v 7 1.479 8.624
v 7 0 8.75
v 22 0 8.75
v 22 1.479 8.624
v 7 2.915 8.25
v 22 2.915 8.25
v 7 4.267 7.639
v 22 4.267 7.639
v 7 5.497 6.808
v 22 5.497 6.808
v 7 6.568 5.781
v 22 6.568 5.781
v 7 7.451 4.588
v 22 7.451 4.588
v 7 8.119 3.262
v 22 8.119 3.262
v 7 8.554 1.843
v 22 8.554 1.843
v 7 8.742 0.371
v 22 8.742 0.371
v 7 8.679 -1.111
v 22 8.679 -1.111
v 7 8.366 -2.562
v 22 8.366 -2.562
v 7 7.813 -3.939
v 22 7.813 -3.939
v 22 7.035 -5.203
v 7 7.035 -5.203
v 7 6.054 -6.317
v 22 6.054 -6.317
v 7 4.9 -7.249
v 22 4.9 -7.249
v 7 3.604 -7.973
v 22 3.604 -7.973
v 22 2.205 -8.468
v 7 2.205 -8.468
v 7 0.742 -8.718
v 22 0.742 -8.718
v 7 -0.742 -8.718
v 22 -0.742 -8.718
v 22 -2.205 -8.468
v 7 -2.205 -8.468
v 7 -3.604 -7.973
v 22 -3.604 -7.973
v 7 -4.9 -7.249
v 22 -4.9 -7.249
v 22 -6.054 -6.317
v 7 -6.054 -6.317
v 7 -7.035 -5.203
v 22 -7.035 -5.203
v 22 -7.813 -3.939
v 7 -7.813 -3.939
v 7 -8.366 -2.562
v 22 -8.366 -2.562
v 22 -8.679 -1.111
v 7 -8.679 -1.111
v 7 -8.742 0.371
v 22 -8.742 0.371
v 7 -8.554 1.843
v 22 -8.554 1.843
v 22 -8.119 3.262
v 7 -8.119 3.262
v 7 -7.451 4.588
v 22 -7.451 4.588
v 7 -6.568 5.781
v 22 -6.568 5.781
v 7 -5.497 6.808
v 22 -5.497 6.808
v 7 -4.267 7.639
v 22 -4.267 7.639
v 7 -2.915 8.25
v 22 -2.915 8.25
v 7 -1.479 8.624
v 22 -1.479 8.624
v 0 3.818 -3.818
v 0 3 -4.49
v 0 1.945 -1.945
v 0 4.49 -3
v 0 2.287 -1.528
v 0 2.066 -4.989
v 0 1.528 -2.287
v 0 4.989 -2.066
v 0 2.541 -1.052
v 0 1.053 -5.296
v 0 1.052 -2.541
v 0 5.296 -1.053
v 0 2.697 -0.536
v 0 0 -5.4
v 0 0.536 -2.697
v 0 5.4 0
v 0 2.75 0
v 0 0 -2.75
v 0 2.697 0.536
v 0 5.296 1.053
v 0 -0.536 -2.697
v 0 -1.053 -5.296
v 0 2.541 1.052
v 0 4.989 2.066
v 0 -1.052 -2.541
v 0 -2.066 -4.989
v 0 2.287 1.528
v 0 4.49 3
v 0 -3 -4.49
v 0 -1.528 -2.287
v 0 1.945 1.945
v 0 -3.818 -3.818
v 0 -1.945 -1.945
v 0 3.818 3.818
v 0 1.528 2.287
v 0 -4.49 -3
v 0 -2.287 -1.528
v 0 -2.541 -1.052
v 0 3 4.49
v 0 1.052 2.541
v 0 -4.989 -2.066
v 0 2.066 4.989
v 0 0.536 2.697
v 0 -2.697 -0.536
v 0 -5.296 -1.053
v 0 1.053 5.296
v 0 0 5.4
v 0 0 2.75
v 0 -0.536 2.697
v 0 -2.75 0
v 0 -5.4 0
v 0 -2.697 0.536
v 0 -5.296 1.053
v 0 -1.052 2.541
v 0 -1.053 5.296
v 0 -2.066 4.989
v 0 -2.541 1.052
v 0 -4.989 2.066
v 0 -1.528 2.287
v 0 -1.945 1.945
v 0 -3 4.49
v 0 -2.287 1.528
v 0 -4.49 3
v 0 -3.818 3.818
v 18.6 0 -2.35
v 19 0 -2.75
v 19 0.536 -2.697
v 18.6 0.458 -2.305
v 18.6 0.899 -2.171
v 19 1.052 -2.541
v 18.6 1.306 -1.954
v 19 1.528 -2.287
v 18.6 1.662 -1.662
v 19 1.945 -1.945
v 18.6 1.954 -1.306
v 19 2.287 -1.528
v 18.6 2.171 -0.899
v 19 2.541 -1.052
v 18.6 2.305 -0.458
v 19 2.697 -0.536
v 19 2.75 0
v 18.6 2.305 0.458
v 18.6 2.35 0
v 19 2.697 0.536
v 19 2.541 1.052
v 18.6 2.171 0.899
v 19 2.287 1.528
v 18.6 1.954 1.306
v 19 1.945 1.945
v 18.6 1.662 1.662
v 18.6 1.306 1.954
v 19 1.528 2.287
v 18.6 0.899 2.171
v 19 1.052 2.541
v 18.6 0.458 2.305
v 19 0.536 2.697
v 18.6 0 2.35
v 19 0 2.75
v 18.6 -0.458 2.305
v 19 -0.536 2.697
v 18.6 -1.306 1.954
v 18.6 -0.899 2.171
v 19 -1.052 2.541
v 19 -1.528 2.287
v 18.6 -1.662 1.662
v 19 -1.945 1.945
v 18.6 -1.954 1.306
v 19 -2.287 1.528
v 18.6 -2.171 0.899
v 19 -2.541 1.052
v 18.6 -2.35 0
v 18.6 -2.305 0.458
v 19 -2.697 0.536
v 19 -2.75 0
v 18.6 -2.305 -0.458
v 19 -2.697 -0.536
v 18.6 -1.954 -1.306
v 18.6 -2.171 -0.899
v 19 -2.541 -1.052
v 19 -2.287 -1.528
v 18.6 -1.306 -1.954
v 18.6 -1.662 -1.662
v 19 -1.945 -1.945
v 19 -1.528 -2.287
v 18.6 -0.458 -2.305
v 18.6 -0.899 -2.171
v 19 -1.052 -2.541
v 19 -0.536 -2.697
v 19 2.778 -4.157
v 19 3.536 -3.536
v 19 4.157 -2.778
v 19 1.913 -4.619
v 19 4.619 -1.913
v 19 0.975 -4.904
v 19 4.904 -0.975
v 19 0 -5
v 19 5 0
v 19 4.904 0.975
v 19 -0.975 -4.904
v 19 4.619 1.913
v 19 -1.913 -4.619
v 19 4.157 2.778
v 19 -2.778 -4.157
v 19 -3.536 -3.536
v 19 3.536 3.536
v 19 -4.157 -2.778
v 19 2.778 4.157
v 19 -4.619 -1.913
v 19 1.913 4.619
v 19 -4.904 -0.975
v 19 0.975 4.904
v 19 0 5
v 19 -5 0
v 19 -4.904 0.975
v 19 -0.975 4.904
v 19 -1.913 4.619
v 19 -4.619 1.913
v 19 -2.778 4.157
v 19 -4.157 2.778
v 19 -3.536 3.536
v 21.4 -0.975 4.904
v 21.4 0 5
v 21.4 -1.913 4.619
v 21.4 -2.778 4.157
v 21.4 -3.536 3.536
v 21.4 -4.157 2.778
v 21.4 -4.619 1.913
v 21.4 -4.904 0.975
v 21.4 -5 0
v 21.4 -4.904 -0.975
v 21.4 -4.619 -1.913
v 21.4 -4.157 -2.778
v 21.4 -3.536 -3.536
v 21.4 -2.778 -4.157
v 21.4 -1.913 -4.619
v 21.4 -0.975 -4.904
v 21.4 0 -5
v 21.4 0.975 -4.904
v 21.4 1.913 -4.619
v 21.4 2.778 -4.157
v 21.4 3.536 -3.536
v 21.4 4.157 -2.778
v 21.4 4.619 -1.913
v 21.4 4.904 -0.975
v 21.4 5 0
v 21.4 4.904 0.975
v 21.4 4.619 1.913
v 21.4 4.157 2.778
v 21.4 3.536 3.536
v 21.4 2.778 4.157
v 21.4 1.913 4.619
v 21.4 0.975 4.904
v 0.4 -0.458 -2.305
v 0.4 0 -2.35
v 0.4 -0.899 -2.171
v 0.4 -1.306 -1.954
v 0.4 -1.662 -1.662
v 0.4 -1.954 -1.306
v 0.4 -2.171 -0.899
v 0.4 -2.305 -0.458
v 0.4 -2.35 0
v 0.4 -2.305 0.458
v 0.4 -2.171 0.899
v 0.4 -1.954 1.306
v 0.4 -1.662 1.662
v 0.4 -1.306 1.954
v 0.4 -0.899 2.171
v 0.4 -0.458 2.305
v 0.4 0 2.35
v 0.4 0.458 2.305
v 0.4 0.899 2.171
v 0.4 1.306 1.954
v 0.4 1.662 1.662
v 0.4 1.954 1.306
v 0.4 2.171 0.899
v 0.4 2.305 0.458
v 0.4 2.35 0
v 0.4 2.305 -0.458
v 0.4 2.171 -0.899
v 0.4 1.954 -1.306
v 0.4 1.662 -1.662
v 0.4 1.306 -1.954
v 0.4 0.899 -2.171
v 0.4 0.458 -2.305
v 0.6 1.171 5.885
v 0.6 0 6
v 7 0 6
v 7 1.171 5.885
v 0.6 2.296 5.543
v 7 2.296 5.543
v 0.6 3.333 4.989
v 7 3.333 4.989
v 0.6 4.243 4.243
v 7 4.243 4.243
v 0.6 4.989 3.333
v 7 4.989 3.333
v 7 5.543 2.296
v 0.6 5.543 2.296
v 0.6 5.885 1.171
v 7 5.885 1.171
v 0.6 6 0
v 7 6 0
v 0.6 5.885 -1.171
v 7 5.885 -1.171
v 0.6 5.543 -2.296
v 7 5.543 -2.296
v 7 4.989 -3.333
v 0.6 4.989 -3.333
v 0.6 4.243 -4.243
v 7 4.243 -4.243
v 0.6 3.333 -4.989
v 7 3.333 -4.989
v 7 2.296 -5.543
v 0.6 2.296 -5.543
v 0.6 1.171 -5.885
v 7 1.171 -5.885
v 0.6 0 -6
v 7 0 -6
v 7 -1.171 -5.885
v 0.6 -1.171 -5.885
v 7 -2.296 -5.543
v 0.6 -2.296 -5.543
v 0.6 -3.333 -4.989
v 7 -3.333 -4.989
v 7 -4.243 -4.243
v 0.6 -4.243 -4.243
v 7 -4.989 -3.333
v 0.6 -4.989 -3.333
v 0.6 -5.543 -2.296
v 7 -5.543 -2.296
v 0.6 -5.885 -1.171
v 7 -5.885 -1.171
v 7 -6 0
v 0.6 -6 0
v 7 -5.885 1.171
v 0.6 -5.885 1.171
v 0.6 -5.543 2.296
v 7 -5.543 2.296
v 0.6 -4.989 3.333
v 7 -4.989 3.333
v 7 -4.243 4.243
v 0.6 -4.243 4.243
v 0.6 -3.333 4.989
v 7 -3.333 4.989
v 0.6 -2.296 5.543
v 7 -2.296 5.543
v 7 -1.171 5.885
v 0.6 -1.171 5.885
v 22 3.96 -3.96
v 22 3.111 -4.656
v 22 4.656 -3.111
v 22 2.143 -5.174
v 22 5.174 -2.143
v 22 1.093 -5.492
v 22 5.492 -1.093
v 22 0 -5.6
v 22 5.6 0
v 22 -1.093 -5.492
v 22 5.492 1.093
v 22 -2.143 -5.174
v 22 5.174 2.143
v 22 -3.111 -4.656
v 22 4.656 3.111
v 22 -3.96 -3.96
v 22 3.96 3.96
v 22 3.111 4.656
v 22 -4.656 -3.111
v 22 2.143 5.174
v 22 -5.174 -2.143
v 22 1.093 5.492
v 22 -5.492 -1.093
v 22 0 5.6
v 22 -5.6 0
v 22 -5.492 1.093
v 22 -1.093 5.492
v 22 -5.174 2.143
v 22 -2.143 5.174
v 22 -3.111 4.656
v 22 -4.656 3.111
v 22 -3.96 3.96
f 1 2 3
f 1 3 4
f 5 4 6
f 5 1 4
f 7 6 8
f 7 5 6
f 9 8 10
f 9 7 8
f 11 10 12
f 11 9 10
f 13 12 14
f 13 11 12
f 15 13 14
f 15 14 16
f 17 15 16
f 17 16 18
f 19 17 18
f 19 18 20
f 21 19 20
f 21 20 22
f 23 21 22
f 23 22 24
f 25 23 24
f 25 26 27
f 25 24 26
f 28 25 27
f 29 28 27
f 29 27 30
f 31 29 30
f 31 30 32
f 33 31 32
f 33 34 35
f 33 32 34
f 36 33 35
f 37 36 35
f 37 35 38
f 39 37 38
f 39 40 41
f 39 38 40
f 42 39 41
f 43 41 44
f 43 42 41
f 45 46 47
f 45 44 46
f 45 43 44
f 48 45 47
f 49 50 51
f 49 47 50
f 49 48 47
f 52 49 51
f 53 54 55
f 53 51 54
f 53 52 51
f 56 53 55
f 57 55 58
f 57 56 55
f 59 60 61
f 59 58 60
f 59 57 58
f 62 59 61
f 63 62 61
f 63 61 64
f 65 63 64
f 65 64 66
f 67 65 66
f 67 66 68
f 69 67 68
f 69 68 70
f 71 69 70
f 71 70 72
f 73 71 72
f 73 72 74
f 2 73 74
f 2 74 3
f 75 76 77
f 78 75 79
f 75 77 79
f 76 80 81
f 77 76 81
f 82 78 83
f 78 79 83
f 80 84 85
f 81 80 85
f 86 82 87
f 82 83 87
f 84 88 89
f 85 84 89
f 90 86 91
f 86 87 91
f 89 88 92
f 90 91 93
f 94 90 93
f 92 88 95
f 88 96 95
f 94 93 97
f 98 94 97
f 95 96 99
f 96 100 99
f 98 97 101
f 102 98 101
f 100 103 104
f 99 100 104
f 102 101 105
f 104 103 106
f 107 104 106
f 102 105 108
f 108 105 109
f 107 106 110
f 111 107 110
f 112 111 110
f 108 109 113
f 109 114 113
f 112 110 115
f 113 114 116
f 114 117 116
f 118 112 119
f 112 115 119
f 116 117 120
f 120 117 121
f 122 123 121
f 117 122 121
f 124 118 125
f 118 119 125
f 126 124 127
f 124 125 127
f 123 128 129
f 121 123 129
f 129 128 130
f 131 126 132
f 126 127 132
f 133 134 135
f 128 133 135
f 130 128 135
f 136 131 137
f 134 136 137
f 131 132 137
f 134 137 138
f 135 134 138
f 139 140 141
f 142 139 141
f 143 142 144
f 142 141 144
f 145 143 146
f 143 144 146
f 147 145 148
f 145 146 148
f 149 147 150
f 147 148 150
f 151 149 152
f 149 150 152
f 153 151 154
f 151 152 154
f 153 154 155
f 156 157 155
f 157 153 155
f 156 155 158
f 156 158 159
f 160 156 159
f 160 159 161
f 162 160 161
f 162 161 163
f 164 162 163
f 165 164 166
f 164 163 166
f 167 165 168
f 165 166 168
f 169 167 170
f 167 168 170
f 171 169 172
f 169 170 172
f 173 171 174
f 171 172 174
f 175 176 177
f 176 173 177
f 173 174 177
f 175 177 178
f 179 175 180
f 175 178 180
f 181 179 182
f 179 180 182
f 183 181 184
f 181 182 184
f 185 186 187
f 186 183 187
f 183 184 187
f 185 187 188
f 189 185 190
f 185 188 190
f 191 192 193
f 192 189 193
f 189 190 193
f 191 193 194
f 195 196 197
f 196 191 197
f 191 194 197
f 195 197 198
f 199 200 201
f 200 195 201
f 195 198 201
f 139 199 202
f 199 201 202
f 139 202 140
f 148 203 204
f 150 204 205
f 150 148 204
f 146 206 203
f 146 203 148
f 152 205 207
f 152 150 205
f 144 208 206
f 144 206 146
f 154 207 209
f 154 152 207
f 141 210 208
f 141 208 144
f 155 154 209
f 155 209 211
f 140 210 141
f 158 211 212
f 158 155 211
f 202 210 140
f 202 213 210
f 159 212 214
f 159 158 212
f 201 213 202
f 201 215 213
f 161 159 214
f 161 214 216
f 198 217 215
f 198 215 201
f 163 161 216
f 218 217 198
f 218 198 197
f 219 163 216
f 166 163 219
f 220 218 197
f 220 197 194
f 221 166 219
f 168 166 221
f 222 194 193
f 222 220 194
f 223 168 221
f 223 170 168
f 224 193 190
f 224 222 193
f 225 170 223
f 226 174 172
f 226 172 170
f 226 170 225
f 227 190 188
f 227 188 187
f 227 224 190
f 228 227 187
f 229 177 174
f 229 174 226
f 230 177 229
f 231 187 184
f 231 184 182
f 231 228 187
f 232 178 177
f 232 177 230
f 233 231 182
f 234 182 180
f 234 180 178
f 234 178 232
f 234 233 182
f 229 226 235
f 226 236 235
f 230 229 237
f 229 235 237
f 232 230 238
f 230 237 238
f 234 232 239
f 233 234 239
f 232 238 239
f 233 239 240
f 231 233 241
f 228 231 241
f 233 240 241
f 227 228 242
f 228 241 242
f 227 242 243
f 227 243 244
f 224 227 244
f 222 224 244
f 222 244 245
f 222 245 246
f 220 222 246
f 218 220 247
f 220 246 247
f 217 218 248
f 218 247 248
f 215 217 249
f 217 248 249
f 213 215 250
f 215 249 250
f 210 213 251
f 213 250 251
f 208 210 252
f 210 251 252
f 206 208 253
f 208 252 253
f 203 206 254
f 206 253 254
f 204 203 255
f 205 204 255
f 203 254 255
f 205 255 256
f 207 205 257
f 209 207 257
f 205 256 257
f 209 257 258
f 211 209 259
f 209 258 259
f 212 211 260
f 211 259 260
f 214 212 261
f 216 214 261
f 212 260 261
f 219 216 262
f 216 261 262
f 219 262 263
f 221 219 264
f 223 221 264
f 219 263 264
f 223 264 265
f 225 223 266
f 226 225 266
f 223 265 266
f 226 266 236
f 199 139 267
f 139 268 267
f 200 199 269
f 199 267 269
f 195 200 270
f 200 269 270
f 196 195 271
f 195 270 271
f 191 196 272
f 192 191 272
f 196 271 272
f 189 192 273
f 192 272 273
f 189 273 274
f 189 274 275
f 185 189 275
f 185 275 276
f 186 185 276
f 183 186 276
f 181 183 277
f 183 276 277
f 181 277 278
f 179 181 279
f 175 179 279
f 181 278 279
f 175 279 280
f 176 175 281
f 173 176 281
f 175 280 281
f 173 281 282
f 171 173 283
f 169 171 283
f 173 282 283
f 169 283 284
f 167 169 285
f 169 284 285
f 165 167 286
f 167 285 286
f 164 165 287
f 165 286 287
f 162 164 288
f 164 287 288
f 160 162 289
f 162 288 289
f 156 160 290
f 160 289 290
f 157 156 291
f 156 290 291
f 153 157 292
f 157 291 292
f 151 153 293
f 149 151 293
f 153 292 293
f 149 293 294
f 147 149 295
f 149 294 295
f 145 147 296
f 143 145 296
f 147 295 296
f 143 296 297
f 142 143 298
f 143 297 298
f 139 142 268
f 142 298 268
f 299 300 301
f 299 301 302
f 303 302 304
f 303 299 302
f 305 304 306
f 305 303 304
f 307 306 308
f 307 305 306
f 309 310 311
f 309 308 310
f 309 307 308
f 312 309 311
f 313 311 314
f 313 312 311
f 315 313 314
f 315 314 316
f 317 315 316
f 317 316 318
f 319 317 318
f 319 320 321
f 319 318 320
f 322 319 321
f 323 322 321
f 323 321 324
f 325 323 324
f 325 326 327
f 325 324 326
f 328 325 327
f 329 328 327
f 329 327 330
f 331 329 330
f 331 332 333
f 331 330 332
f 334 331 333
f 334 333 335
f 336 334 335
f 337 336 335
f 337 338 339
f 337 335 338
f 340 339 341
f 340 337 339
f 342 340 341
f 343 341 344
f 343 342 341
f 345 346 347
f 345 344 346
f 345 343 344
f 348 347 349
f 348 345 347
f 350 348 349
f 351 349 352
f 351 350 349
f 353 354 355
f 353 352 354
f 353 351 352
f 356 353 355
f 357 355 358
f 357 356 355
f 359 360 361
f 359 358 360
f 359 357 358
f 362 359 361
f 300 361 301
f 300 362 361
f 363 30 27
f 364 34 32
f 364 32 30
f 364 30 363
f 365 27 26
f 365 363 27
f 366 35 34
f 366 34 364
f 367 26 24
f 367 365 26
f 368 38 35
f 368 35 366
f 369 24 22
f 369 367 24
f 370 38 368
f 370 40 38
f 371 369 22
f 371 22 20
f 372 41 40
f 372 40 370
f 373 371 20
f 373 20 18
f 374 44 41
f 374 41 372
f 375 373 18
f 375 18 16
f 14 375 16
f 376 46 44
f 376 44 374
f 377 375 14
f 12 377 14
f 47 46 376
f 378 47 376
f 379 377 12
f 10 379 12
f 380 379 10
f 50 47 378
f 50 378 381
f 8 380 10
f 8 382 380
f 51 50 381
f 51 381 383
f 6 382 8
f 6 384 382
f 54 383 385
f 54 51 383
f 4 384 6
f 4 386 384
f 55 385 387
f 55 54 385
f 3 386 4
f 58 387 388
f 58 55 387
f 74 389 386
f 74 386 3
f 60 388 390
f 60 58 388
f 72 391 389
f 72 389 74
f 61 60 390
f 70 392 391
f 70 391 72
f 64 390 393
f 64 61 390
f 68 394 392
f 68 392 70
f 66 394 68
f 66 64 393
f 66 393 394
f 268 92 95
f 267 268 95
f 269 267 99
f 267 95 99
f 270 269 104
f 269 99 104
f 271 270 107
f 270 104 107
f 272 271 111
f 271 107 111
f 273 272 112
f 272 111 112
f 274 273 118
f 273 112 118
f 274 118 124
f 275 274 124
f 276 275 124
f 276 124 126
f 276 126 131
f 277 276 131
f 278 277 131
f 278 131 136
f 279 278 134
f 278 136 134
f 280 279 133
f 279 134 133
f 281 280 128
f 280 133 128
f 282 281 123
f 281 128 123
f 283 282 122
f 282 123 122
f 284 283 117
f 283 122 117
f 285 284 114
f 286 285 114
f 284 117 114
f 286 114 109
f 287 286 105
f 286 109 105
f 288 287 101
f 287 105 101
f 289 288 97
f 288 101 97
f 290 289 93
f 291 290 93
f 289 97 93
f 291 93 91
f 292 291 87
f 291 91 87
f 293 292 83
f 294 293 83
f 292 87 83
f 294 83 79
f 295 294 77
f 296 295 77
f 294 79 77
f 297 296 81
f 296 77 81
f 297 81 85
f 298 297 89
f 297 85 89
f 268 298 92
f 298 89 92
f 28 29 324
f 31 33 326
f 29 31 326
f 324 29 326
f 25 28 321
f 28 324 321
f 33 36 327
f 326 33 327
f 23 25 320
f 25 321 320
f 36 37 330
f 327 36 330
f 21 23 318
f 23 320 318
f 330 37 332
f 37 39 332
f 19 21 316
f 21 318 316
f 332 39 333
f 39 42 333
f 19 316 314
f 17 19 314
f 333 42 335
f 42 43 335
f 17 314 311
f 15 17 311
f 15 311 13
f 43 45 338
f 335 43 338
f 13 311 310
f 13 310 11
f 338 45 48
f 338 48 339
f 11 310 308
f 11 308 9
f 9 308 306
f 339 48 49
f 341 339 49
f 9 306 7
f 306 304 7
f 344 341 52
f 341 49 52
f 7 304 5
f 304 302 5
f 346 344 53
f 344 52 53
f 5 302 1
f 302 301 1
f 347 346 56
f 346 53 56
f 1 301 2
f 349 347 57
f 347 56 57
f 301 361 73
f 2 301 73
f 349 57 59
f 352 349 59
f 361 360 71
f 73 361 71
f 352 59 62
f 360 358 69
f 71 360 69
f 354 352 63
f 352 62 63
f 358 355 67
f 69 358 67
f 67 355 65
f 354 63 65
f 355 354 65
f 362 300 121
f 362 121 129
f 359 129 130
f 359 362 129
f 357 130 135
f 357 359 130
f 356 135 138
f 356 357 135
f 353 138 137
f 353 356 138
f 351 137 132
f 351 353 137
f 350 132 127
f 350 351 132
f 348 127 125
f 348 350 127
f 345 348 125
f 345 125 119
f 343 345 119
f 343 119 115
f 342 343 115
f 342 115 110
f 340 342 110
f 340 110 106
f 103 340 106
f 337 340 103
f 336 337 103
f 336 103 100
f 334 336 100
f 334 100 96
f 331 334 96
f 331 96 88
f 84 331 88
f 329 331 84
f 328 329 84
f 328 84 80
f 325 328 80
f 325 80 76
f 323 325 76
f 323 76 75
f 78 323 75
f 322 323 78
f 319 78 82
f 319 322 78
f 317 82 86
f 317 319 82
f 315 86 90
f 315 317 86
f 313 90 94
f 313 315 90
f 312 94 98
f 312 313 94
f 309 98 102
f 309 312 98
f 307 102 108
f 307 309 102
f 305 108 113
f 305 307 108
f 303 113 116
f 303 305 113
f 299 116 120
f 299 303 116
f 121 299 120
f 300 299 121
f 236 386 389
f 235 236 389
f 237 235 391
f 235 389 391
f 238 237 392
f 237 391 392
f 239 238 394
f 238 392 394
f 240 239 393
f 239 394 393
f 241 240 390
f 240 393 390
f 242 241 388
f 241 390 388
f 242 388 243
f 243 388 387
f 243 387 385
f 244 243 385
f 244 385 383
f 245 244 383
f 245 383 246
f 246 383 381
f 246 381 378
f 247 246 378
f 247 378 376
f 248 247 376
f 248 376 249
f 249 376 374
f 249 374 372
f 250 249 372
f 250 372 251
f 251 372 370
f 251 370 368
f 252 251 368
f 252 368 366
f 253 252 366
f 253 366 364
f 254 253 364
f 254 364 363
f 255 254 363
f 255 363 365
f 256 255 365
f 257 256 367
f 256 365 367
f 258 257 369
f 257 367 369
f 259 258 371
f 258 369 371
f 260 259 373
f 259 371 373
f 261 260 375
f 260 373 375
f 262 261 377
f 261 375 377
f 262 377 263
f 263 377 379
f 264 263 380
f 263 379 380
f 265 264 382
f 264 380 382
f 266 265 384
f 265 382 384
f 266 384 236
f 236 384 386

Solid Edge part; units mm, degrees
sketch "Sketch1" plane through (0, 0, 0) normal (0, -1, 0) x (1, 0, 0)
  line L0 (19, 0) -> (19, 5)
  line L1 (19, 5) -> (22, 5)
  line L2 (22, 5) -> (22, 8.75)
  line L3 (22, 8.75) -> (7, 8.75)
  line L4 (7, 8.75) -> (7, 6)
  line L5 (7, 6) -> (0, 6)
  line L6 (0, 6) -> (0, 0)
  dimension "D1" = 3
  dimension "D2" = 12
  dimension "D3" = 7
revolve "RevolvedProtrusion1" add sketch "Sketch1" angle 360 about axis through (0, 0, 0) along (1, 0, 0)
hole "thread" at (19, 0, 0) direction (-1, 0, 0) diameter 4.7 depth 30 tip angle 118 start chamfer 0.4 start chamfer angle 45 end chamfer 0.4 end chamfer angle 45
chamfer "mounting_chamfers" distance 0.6 angle 45 2 edges at (0, 0, -6) (22, 0, -5)
properties material "Polyethylene, low density"
